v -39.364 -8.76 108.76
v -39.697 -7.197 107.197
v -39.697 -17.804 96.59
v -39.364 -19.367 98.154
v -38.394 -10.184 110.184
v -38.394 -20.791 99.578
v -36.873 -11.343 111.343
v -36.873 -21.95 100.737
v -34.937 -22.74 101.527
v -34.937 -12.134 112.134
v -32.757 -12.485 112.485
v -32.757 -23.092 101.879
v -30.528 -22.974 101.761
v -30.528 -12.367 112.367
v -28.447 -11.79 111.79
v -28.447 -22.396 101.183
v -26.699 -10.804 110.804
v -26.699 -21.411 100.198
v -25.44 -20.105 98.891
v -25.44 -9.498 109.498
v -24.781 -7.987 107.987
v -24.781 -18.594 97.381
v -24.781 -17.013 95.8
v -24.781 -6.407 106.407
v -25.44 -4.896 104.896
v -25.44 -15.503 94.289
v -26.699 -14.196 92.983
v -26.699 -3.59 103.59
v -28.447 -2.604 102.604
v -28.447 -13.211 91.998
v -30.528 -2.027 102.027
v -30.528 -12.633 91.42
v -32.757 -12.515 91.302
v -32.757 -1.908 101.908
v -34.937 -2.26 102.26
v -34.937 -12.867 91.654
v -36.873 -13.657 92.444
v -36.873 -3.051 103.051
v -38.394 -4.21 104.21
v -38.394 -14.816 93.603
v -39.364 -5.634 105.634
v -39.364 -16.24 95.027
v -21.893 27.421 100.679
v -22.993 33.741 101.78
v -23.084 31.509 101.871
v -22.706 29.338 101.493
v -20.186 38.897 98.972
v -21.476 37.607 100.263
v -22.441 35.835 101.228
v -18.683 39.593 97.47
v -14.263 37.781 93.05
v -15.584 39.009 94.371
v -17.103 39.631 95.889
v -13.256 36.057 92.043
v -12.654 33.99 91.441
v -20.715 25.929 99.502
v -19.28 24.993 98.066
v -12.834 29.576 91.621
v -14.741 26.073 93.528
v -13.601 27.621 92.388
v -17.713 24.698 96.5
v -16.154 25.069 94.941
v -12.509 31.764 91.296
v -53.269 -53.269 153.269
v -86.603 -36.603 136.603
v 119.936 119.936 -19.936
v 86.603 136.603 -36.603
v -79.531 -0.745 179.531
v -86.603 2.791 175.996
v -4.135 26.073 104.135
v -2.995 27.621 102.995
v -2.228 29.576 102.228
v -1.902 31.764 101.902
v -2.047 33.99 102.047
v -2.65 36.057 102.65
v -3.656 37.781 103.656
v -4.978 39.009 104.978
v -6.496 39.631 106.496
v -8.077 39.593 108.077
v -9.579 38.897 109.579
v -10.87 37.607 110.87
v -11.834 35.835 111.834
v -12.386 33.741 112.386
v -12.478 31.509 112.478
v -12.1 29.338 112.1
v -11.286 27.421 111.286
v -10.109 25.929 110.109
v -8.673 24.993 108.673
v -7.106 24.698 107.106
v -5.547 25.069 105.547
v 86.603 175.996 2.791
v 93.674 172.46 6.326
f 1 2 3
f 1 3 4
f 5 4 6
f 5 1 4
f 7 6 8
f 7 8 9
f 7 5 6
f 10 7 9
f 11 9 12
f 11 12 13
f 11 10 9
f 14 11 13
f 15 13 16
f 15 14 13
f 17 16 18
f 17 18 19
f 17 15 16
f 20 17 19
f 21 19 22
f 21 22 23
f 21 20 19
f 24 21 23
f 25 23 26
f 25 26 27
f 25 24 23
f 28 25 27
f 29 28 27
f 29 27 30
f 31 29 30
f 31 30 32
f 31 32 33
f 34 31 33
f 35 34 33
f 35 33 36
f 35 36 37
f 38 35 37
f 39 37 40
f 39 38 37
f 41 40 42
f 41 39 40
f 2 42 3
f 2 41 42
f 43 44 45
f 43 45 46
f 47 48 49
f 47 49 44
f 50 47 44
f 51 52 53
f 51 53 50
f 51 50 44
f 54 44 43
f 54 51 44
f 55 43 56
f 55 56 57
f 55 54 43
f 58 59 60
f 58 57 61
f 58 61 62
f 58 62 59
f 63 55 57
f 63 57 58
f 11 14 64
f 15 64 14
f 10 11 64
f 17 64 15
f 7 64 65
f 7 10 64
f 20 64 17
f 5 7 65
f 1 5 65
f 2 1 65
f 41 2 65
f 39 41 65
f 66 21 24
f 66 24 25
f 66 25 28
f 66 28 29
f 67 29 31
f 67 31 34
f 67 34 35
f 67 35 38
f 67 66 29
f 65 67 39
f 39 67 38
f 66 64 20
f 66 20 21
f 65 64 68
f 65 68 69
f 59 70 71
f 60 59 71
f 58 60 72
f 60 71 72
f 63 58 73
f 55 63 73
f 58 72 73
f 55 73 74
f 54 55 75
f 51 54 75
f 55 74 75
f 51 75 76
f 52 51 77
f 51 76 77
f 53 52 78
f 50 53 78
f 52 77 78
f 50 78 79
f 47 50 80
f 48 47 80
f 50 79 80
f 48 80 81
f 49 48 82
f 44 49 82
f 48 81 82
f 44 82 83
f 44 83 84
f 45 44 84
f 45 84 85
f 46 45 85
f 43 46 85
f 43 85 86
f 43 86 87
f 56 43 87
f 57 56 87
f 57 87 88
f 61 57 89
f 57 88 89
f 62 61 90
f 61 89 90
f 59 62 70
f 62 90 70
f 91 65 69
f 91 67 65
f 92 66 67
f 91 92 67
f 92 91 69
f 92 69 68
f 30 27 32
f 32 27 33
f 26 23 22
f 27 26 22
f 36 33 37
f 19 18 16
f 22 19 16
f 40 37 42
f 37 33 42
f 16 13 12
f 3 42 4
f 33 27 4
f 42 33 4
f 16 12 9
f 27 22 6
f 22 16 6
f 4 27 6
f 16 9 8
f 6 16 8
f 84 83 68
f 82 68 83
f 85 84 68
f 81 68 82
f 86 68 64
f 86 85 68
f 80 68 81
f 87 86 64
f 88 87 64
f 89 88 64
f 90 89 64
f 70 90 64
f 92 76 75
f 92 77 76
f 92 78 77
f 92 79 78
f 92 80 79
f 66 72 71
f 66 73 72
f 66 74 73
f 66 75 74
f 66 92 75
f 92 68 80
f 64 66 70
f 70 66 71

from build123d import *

# Parameters (mm, degrees)
PAD001_DEPTH            = 150
SKETCH001_R             = 7.5
PAD_DEPTH               = 15
SKETCH003_R             = 7.5
POCKET003_DEPTH         = 15
BODY004_PLACEMENT_ANGLE = 180


with BuildPart() as part:
    # Sketch002 (on DatumPlane) → Pad001 (new body, symmetric)
    with BuildSketch(Plane(origin=(0, -50, 50), x_dir=(0.816497, -0.408248, -0.408248), z_dir=(-0.57735, -0.57735, -0.57735))):
        Polygon((0, 0), (0, 55.710678), (-8.660254, 55.710678), (-40.824829, 0), align=None)
    extrude(amount=PAD001_DEPTH, both=True)

    # Sketch001 (on Face7 of Binder001) → Pad (join)
    with BuildSketch(Plane(origin=(0, -50, 50), x_dir=(1, 0, 0), z_dir=(0, -0.707107, 0.707107))):
        with Locations((32.196959, 80.888716)):
            Circle(SKETCH001_R)
    extrude(amount=-PAD_DEPTH)

    # Sketch003 (on Face6 of Pad) → Pocket003 (cut)
    with BuildSketch(Plane(origin=(-25, -50, 75), x_dir=(-0.408248, 0.816497, -0.408248), z_dir=(-0.707107, 0, 0.707107))):
        with Locations((-11.75216, -47.456286)):
            Circle(SKETCH003_R)
    extrude(amount=-POCKET003_DEPTH, mode=Mode.SUBTRACT)


with BuildPart() as part_1:
    # Body004 placement: moved
    add(part.part.rotate(Axis((0, 0, 0), (0, 0, 1)), BODY004_PLACEMENT_ANGLE))


solid = part_1.part
